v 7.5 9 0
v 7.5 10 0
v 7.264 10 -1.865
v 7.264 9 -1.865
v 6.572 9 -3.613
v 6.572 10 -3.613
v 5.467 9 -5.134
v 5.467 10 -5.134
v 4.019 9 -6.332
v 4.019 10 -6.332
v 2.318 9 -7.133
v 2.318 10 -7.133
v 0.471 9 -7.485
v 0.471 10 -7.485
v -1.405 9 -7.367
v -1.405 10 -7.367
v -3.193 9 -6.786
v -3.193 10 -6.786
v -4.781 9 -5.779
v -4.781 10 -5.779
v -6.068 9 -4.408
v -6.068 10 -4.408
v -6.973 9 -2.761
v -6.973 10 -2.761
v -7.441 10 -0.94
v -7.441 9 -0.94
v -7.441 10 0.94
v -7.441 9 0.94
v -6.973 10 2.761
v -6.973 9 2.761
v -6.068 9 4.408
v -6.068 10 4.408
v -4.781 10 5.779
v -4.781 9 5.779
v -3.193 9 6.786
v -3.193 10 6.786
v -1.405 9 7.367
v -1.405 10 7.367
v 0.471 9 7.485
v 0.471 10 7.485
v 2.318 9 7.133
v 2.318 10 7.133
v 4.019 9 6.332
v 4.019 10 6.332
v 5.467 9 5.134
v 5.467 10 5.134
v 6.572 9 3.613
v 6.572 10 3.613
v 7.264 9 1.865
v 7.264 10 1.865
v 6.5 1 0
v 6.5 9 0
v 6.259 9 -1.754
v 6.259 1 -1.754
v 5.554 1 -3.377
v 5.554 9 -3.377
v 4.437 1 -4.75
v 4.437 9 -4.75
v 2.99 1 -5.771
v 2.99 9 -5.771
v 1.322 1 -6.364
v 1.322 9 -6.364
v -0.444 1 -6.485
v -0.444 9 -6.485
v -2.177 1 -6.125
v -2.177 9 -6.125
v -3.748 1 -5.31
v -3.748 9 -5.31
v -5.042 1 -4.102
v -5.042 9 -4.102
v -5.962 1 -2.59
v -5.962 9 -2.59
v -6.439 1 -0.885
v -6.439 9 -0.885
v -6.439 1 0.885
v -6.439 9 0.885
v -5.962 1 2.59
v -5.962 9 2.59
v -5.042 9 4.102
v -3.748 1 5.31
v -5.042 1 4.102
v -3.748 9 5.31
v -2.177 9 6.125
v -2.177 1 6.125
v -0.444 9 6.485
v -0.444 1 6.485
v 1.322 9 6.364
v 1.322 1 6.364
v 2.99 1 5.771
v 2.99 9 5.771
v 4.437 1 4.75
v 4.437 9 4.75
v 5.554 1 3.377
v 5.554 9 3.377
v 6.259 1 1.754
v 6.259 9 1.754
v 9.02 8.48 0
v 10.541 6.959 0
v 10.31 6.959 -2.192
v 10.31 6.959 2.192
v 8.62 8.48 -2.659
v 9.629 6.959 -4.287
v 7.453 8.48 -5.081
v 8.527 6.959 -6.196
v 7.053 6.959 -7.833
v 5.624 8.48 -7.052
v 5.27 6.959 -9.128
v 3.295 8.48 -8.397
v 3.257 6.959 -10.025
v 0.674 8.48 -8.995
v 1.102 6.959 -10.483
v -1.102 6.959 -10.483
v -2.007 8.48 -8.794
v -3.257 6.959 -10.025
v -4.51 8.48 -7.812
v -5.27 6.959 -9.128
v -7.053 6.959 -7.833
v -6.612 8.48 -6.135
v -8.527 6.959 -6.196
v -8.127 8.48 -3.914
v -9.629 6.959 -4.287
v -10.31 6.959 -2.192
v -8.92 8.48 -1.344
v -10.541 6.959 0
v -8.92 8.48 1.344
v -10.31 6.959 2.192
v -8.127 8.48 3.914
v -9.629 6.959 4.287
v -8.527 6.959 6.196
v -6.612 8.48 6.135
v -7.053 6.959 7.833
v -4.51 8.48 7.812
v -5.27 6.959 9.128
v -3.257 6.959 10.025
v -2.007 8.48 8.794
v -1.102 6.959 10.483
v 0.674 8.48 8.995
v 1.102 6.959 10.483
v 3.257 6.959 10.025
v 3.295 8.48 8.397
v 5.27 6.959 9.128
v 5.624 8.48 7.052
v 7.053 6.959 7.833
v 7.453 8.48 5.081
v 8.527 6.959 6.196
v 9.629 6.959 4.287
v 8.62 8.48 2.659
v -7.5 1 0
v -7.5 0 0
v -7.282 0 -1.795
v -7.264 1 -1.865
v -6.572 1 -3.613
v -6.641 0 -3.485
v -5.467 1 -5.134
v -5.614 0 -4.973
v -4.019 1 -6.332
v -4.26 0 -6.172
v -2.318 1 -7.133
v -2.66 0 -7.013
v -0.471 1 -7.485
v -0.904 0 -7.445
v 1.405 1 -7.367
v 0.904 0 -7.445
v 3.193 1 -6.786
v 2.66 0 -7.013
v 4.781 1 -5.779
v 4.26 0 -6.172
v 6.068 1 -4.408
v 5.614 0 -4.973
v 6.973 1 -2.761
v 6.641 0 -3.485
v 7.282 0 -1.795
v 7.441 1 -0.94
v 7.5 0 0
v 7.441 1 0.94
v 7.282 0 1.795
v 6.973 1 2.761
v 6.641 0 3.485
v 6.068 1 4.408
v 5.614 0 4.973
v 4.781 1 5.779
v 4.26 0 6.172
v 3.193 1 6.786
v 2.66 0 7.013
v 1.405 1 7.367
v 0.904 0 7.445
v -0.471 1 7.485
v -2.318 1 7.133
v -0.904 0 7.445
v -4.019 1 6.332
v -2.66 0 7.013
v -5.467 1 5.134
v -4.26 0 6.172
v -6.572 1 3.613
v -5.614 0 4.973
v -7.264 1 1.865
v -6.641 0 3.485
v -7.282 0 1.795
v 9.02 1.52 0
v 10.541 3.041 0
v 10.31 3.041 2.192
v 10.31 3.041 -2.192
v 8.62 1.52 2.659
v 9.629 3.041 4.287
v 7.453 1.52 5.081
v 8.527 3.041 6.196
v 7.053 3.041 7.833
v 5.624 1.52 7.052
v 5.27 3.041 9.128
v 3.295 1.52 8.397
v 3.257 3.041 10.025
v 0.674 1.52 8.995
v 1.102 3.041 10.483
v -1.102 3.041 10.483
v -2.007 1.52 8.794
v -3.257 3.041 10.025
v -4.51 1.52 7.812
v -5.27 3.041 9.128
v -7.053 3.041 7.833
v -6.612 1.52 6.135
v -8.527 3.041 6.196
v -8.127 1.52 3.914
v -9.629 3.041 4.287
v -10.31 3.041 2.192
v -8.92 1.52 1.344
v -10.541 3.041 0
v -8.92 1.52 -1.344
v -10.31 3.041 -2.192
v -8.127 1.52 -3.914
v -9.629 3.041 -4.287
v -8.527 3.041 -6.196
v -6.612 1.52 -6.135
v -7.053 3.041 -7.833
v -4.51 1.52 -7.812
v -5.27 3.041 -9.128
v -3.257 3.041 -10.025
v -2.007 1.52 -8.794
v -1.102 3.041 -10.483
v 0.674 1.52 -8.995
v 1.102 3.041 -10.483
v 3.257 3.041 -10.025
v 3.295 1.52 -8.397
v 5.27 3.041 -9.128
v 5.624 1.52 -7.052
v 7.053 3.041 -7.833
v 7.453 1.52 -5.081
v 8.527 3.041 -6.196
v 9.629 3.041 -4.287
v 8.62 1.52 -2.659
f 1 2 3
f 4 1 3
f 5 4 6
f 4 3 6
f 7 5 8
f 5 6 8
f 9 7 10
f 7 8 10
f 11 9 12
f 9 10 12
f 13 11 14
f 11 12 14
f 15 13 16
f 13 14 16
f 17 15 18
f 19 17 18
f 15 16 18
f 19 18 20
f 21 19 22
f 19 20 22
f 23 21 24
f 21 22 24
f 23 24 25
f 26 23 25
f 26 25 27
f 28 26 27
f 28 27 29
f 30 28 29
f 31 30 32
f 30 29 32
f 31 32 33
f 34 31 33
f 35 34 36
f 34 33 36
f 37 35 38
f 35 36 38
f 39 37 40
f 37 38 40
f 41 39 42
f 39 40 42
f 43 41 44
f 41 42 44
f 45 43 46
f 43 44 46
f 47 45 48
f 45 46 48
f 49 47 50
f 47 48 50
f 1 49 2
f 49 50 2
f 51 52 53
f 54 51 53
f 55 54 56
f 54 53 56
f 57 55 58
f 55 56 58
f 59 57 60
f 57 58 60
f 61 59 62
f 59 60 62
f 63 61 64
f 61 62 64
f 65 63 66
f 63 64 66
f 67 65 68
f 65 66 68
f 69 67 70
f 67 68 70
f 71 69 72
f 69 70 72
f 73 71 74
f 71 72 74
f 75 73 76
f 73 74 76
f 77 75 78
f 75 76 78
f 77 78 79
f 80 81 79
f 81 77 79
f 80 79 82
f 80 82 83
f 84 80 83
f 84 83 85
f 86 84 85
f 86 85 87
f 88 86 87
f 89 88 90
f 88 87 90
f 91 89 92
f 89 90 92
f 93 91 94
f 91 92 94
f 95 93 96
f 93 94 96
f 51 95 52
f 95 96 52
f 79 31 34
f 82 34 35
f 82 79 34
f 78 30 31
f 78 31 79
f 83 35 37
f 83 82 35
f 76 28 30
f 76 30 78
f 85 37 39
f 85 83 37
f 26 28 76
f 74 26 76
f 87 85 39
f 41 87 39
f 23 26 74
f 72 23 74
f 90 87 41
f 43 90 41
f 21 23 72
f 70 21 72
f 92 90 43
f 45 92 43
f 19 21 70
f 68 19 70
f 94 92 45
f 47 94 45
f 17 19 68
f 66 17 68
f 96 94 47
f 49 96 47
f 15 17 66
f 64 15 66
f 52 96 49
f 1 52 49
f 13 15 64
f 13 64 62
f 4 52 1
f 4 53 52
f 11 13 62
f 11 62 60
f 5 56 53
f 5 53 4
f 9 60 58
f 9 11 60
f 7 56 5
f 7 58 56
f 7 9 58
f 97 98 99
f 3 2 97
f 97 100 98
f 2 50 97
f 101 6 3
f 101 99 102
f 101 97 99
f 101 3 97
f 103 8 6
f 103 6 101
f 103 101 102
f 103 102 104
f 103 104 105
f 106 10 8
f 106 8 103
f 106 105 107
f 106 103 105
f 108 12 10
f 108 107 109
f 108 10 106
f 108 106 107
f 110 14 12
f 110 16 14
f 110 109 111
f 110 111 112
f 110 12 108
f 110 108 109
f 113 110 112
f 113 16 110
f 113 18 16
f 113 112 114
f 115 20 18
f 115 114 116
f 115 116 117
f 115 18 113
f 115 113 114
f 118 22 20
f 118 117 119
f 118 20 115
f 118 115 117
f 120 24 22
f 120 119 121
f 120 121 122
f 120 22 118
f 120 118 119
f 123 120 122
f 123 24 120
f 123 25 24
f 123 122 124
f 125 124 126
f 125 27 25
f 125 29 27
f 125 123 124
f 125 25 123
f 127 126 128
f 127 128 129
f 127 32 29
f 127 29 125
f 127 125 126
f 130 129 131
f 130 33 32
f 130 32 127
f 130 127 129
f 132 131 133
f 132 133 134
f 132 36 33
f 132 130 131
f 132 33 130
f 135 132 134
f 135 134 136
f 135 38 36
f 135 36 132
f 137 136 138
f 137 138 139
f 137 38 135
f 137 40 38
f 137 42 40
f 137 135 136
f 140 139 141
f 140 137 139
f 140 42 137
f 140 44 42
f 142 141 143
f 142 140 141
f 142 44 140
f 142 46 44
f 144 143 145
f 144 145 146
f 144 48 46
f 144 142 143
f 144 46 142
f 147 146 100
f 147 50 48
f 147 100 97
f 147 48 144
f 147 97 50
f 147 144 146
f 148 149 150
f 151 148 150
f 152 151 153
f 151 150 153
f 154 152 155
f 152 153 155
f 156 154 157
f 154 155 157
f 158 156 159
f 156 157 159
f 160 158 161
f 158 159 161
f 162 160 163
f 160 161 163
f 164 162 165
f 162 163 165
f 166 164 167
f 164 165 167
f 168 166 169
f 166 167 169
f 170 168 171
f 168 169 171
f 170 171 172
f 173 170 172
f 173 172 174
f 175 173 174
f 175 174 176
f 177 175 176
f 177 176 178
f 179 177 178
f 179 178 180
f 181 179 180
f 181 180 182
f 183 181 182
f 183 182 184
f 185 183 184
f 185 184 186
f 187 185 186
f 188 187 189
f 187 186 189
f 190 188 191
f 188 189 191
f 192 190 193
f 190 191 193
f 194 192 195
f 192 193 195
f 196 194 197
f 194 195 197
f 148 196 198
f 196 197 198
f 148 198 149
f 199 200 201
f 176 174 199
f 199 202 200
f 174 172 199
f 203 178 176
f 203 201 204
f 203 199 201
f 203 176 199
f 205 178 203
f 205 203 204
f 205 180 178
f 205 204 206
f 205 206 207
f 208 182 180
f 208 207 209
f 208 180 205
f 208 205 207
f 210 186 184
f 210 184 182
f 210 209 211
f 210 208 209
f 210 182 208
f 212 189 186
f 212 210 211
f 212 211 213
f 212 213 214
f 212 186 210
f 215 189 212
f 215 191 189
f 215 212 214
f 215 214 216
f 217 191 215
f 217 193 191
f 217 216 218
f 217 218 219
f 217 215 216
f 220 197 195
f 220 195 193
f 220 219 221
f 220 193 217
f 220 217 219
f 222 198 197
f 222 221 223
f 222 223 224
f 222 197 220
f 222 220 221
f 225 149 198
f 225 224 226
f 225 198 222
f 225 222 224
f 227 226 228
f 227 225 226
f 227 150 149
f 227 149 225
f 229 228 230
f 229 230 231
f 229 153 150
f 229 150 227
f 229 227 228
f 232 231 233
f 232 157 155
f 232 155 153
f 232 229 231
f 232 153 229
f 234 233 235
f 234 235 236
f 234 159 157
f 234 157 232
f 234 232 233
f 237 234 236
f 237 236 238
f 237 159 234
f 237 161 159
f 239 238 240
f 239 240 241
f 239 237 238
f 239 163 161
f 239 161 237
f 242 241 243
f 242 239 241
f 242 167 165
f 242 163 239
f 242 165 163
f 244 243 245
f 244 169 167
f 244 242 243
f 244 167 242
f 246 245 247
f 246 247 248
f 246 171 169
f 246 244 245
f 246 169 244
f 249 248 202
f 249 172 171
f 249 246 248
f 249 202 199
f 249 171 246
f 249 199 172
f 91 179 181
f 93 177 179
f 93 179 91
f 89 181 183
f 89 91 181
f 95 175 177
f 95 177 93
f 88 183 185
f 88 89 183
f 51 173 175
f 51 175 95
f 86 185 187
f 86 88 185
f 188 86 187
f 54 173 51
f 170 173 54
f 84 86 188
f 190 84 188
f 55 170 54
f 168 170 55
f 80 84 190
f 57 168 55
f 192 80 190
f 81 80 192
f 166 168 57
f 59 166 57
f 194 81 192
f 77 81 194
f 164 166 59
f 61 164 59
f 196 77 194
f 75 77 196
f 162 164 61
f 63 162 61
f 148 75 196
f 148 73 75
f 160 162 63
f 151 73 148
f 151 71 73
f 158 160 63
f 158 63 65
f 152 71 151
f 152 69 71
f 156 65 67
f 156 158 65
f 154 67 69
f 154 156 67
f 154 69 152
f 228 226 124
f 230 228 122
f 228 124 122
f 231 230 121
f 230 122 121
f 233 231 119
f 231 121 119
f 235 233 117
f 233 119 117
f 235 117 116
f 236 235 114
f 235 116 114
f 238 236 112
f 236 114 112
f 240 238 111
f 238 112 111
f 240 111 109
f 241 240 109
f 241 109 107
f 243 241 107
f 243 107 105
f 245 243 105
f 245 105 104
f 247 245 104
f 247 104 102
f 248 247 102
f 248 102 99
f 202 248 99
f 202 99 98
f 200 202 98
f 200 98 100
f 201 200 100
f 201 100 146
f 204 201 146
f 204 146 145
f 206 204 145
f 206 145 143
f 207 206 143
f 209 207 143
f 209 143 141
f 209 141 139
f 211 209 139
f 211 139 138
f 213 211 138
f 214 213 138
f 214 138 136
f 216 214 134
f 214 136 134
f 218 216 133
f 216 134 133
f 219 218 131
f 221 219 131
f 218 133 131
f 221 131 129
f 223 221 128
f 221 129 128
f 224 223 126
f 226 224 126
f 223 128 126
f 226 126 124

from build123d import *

# Parameters (mm, degrees)
SKETCH1_R           = 7.5
BOSS_EXTRUDE3_DEPTH = 10
SKETCH54_R          = 10.540559159
BOSS_EXTRUDE5_DEPTH = 3.040559
BOSS_EXTRUDE5_TAPER = 45
SKETCH55_R          = 10.540559159
BOSS_EXTRUDE6_DEPTH = 3.040559
BOSS_EXTRUDE6_TAPER = 45
SKETCH56_R          = 10.540559159
BOSS_EXTRUDE7_DEPTH = 3.918882
SKETCH53_R          = 6.5
CUT_EXTRUDE7_DEPTH  = 11.0000001
SKETCH57_R          = 7.5
SKETCH57_R_2        = 6.5
CUT_EXTRUDE8_DEPTH  = 1
SKETCH59_R          = 7.5
SKETCH59_R_2        = 6.5
CUT_EXTRUDE9_DEPTH  = 1


with BuildPart() as part:
    # Sketch1 → Boss-Extrude3 (new body)
    with BuildSketch(Plane(origin=(0, 0, 0), x_dir=(1, 0, 0), z_dir=(0, 1, 0))):
        Circle(SKETCH1_R)
    extrude(amount=BOSS_EXTRUDE3_DEPTH)

    # Sketch54 → Boss-Extrude5 (add)
    with BuildSketch(Plane(origin=(0, 6.959440841, 0), x_dir=(1, 0, 0), z_dir=(0, 1, 0))):
        Circle(SKETCH54_R)
    extrude(amount=BOSS_EXTRUDE5_DEPTH, taper=BOSS_EXTRUDE5_TAPER)

    # Sketch55 → Boss-Extrude6 (add)
    with BuildSketch(Plane.XZ.offset(-3.040559159)):
        Circle(SKETCH55_R)
    extrude(amount=BOSS_EXTRUDE6_DEPTH, taper=BOSS_EXTRUDE6_TAPER)

    # Sketch56 → Boss-Extrude7 (add)
    with BuildSketch(Plane(origin=(0, 6.959440841, 0), x_dir=(-1, 0, 0), z_dir=(0, -1, 0))):
        Circle(SKETCH56_R)
    extrude(amount=BOSS_EXTRUDE7_DEPTH)

    # Sketch53 → Cut-Extrude7 (cut, through all)
    with BuildSketch(Plane(origin=(0, 10, 0), x_dir=(1, 0, 0), z_dir=(0, 1, 0))):
        Circle(SKETCH53_R)
    extrude(amount=-CUT_EXTRUDE7_DEPTH, mode=Mode.SUBTRACT)

    # Sketch57 → Cut-Extrude8 (cut)
    with BuildSketch(Plane(origin=(0, 0, 0), x_dir=(-1, 0, 0), z_dir=(0, -1, 0))):
        Circle(SKETCH57_R)
        Circle(SKETCH57_R_2, mode=Mode.SUBTRACT)
    extrude(amount=-CUT_EXTRUDE8_DEPTH, mode=Mode.SUBTRACT)

    # Sketch59 → Cut-Extrude9 (cut)
    with BuildSketch(Plane(origin=(0, 10, 0), x_dir=(1, 0, 0), z_dir=(0, 1, 0))):
        Circle(SKETCH59_R)
        Circle(SKETCH59_R_2, mode=Mode.SUBTRACT)
    extrude(amount=-CUT_EXTRUDE9_DEPTH, mode=Mode.SUBTRACT)


solid = part.part
